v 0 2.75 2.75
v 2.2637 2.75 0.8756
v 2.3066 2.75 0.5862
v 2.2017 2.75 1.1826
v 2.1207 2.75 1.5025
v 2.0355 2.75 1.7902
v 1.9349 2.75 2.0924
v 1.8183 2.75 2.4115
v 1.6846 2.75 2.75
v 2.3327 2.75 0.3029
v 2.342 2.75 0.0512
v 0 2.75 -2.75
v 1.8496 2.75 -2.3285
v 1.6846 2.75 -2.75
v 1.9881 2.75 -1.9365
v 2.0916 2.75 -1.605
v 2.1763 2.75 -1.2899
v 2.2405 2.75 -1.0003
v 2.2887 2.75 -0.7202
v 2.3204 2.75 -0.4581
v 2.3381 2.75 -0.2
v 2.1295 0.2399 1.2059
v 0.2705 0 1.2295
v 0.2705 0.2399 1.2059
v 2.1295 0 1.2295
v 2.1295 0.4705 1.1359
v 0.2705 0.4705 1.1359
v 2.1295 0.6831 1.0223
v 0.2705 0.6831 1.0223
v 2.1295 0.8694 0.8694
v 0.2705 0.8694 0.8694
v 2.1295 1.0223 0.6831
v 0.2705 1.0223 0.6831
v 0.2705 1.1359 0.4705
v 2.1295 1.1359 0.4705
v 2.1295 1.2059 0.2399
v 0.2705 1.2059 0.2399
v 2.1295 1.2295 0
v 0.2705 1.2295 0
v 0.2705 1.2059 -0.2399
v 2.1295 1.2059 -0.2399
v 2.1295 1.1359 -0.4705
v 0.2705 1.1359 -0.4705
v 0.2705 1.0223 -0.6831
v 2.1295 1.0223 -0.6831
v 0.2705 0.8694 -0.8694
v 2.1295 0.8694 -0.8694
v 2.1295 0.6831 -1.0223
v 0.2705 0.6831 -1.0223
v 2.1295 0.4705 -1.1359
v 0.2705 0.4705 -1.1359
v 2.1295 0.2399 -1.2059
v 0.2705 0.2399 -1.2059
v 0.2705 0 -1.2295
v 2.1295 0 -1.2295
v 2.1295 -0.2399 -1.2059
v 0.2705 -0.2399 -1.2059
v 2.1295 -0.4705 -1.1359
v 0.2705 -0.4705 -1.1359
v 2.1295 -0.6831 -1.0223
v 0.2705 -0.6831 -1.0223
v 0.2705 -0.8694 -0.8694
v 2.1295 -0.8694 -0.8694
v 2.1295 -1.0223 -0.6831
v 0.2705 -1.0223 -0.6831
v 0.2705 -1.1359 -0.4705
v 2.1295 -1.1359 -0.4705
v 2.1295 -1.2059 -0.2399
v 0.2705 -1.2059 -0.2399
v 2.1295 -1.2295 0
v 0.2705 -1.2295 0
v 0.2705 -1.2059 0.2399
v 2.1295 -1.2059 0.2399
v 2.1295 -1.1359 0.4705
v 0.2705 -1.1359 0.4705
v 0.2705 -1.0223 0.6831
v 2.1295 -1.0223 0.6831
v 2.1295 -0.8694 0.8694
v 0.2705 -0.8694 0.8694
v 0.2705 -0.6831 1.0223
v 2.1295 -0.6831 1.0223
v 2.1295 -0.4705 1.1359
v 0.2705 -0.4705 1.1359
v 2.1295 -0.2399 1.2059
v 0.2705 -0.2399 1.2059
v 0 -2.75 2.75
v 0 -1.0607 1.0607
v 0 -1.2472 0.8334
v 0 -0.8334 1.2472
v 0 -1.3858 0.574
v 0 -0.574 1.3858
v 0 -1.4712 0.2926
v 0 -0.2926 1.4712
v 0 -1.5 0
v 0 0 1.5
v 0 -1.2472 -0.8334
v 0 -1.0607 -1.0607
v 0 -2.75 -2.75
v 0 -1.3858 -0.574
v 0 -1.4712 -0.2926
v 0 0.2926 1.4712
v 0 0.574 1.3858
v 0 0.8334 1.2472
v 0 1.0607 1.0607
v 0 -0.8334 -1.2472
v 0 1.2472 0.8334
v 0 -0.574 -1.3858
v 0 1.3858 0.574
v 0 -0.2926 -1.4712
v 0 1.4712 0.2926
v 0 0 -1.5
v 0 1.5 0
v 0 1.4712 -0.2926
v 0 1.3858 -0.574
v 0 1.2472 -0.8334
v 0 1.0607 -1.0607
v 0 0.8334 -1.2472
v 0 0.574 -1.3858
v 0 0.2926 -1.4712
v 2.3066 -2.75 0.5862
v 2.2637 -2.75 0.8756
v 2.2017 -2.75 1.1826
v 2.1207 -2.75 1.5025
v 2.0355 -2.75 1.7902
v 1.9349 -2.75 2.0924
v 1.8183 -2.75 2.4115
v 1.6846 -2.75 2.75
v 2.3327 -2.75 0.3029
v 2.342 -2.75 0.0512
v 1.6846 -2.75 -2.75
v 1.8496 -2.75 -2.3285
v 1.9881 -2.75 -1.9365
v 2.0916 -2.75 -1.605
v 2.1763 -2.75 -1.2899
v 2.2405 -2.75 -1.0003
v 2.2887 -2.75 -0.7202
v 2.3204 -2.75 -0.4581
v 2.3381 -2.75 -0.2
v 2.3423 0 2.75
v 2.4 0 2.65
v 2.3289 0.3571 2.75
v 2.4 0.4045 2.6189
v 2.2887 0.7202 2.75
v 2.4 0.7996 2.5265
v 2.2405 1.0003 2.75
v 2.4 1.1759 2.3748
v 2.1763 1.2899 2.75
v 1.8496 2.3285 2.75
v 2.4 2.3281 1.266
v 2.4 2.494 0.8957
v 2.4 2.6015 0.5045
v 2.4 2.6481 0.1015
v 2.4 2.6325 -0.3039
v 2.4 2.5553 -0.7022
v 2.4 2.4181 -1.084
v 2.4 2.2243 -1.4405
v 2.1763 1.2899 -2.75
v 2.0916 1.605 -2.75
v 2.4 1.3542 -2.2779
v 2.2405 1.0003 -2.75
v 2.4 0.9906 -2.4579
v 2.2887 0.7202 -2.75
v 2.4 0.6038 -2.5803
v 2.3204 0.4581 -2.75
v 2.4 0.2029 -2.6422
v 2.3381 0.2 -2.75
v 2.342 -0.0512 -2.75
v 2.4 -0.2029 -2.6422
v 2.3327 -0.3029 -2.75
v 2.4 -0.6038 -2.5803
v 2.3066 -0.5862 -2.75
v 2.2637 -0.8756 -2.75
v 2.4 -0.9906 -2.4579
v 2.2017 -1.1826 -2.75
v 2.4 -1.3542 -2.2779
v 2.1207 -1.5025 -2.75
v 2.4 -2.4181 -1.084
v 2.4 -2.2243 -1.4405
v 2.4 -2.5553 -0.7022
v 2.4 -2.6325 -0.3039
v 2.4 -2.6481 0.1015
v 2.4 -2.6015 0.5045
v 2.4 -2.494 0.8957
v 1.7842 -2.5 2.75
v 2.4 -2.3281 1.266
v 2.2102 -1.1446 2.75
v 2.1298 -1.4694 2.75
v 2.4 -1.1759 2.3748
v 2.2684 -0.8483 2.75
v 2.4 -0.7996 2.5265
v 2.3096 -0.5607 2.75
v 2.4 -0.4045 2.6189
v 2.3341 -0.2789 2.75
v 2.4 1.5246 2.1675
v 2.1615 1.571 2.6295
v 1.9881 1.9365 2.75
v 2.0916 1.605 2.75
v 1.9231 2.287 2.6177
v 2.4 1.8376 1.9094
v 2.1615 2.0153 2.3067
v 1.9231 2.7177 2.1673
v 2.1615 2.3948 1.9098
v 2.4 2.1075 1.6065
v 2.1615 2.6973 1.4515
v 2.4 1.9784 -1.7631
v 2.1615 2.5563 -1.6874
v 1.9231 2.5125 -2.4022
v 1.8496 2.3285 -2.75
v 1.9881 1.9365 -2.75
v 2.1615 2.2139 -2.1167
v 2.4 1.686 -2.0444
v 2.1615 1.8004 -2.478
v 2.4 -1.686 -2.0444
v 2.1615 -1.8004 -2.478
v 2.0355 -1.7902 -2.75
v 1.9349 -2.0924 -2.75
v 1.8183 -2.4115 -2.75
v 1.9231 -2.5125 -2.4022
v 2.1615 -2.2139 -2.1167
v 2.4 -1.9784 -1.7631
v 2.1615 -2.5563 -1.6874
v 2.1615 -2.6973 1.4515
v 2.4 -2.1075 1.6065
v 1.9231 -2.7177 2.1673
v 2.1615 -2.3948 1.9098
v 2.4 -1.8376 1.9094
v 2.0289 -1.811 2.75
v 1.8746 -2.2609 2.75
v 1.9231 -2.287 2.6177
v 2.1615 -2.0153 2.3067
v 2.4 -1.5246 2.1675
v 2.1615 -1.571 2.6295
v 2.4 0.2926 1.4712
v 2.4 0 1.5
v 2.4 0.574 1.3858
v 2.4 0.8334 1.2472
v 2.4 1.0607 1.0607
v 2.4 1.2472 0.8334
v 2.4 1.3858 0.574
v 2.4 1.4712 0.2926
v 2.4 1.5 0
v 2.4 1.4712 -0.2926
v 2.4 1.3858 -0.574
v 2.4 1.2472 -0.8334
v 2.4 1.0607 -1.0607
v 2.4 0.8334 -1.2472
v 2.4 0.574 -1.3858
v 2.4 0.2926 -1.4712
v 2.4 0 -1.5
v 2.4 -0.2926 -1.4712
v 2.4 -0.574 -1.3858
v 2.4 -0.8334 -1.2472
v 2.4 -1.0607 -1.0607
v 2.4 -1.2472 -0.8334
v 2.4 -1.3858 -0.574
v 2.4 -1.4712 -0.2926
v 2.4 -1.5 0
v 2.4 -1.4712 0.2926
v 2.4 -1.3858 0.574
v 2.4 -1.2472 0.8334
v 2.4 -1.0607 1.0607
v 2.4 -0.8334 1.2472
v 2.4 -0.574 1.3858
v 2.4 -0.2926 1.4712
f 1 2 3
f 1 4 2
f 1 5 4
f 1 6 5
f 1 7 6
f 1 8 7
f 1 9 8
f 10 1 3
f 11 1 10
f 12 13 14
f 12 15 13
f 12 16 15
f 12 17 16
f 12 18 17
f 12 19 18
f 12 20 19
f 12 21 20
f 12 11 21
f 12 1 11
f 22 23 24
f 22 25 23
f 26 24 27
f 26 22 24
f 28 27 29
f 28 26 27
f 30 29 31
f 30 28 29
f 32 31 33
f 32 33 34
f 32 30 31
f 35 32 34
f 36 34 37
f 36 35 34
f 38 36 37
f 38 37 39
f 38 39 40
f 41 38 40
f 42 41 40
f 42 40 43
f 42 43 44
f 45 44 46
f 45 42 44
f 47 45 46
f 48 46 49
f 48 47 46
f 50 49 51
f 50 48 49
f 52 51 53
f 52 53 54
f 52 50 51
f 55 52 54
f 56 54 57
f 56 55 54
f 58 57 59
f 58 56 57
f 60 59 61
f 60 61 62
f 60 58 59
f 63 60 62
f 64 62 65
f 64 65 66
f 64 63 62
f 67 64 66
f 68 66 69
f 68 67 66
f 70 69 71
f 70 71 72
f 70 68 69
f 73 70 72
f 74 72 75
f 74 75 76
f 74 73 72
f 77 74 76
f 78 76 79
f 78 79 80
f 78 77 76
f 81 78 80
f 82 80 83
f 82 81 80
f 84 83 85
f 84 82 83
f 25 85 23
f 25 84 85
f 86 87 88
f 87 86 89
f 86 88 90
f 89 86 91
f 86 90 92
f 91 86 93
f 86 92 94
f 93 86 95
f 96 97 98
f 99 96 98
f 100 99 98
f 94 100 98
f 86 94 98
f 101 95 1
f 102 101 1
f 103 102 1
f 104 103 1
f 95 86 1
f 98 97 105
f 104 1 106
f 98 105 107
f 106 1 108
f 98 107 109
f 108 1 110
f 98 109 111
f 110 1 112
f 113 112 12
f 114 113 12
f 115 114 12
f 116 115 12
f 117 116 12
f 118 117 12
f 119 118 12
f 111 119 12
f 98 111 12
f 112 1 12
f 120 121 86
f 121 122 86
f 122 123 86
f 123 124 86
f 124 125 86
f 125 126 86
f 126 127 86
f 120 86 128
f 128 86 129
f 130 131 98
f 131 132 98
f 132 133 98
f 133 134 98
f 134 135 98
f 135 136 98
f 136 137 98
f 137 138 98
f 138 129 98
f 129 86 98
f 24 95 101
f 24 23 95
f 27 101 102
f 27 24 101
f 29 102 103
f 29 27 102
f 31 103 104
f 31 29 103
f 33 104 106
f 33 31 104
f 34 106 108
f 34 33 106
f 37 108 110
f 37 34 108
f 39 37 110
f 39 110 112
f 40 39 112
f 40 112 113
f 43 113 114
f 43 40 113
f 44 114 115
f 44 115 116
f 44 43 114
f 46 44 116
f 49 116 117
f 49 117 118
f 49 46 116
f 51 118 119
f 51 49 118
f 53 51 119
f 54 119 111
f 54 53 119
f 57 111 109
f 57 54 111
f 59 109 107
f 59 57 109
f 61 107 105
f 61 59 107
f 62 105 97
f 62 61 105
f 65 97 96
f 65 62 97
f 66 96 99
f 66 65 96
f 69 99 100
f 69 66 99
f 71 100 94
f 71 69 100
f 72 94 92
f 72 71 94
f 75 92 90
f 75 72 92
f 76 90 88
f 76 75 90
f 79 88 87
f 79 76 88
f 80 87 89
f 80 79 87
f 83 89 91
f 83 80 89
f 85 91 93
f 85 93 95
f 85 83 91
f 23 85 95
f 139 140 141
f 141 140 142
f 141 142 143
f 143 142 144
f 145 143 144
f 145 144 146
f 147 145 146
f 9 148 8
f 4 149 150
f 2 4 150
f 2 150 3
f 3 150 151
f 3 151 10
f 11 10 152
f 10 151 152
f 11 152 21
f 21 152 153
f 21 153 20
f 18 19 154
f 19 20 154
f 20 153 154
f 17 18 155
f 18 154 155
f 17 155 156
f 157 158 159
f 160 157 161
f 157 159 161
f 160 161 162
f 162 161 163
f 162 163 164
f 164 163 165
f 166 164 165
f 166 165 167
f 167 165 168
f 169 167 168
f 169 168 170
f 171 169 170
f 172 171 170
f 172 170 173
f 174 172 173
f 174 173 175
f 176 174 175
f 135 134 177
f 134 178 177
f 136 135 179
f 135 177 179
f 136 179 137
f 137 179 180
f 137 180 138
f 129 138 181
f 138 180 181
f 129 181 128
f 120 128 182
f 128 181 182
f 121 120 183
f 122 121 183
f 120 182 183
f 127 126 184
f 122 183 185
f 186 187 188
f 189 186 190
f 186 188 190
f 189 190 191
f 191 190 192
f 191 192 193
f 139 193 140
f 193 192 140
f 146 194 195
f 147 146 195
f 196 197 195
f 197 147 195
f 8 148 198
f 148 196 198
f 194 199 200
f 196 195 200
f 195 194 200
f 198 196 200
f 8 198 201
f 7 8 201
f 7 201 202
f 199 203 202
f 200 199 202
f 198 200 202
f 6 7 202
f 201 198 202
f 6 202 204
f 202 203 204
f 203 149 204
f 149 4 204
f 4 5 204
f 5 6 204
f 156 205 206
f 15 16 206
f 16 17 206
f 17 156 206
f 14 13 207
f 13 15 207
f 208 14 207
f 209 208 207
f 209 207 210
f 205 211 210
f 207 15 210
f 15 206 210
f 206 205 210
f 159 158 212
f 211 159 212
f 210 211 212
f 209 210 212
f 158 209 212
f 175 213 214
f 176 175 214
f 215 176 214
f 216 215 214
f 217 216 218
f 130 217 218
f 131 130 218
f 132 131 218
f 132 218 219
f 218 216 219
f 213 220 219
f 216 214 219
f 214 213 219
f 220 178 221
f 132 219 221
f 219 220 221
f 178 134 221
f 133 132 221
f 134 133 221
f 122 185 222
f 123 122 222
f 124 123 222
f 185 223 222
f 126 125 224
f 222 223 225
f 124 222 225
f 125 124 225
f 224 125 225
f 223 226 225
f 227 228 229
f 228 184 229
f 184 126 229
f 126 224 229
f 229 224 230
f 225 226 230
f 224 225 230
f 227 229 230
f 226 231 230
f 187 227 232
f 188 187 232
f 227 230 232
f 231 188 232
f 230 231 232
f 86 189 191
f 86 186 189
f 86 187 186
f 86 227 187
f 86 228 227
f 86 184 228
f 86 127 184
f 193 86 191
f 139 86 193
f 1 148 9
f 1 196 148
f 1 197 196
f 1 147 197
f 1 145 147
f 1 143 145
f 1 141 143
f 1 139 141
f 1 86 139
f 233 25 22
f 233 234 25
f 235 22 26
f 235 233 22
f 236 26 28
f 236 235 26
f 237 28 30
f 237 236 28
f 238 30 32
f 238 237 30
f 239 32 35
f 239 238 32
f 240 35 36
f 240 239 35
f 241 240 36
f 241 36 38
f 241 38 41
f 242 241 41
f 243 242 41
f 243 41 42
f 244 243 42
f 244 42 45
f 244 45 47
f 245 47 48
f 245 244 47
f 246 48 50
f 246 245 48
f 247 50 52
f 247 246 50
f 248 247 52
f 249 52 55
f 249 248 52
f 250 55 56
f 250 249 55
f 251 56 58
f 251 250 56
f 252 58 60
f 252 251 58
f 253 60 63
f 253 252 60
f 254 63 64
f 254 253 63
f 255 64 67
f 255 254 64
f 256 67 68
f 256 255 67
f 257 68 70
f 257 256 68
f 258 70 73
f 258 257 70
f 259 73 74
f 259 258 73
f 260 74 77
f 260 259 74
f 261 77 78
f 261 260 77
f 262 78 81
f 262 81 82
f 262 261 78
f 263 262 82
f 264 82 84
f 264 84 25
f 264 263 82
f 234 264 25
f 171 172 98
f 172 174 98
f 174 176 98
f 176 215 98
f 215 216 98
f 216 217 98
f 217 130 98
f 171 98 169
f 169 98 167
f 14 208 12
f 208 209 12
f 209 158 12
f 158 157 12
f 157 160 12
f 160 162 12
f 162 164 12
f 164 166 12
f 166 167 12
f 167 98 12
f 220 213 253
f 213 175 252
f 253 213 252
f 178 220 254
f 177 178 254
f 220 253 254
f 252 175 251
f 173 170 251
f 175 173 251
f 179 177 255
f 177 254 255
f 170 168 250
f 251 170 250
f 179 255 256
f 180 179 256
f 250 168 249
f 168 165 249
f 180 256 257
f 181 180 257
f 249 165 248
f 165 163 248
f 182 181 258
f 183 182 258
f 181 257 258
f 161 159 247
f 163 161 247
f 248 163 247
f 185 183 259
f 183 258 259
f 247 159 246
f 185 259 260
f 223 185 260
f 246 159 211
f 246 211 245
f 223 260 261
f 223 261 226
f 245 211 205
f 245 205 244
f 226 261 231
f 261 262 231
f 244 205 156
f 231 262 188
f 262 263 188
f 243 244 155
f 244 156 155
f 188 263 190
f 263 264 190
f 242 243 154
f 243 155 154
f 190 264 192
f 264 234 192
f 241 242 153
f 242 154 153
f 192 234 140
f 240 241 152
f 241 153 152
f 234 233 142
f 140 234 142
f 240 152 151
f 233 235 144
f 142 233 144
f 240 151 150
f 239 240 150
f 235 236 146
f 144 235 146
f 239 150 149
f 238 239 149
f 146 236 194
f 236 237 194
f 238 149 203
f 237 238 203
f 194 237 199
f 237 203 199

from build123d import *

# Parameters (mm, degrees)
SKETCH2_R          = 5
SKETCH2_W          = 5.5
SKETCH2_H          = 5.5
CUT_EXTRUDE1_DEPTH = 6


with BuildPart() as part:
    # Sketch1 → Revolve1 (revolve)
    with BuildSketch(Plane.XY, mode=Mode.PRIVATE) as revolve1_sk:
        Polygon((0, 0), (0, 3.9), (1.678312164, 3.9), (2.4, 2.65), (2.4, 0), align=None)
    revolve(revolve1_sk.sketch.rotate(Axis((2.4, 0, 0), (-1, 0, 0)), 270), axis=Axis((2.4, 0, 0), (-1, 0, 0)))

    # Sketch2 → Cut-Extrude1 (cut)
    with BuildSketch(Plane(origin=(0, 0, 0), x_dir=(0, 0, -1), z_dir=(1, 0, 0))):
        Circle(SKETCH2_R)
        Rectangle(SKETCH2_W, SKETCH2_H, mode=Mode.SUBTRACT)
    extrude(amount=CUT_EXTRUDE1_DEPTH, mode=Mode.SUBTRACT)

    # Sketch3 → Cut-Revolve1 (revolve, cut)
    with BuildSketch(Plane.XY, mode=Mode.PRIVATE) as cut_revolve1_sk:
        Polygon((0, 0), (0, 1.5), (0.2705, 1.2295), (2.1295, 1.2295), (2.4, 1.5), (2.4, 0), align=None)
    revolve(cut_revolve1_sk.sketch.rotate(Axis((2.4, 0, 0), (-1, 0, 0)), 270), axis=Axis((2.4, 0, 0), (-1, 0, 0)), mode=Mode.SUBTRACT)


solid = part.part
